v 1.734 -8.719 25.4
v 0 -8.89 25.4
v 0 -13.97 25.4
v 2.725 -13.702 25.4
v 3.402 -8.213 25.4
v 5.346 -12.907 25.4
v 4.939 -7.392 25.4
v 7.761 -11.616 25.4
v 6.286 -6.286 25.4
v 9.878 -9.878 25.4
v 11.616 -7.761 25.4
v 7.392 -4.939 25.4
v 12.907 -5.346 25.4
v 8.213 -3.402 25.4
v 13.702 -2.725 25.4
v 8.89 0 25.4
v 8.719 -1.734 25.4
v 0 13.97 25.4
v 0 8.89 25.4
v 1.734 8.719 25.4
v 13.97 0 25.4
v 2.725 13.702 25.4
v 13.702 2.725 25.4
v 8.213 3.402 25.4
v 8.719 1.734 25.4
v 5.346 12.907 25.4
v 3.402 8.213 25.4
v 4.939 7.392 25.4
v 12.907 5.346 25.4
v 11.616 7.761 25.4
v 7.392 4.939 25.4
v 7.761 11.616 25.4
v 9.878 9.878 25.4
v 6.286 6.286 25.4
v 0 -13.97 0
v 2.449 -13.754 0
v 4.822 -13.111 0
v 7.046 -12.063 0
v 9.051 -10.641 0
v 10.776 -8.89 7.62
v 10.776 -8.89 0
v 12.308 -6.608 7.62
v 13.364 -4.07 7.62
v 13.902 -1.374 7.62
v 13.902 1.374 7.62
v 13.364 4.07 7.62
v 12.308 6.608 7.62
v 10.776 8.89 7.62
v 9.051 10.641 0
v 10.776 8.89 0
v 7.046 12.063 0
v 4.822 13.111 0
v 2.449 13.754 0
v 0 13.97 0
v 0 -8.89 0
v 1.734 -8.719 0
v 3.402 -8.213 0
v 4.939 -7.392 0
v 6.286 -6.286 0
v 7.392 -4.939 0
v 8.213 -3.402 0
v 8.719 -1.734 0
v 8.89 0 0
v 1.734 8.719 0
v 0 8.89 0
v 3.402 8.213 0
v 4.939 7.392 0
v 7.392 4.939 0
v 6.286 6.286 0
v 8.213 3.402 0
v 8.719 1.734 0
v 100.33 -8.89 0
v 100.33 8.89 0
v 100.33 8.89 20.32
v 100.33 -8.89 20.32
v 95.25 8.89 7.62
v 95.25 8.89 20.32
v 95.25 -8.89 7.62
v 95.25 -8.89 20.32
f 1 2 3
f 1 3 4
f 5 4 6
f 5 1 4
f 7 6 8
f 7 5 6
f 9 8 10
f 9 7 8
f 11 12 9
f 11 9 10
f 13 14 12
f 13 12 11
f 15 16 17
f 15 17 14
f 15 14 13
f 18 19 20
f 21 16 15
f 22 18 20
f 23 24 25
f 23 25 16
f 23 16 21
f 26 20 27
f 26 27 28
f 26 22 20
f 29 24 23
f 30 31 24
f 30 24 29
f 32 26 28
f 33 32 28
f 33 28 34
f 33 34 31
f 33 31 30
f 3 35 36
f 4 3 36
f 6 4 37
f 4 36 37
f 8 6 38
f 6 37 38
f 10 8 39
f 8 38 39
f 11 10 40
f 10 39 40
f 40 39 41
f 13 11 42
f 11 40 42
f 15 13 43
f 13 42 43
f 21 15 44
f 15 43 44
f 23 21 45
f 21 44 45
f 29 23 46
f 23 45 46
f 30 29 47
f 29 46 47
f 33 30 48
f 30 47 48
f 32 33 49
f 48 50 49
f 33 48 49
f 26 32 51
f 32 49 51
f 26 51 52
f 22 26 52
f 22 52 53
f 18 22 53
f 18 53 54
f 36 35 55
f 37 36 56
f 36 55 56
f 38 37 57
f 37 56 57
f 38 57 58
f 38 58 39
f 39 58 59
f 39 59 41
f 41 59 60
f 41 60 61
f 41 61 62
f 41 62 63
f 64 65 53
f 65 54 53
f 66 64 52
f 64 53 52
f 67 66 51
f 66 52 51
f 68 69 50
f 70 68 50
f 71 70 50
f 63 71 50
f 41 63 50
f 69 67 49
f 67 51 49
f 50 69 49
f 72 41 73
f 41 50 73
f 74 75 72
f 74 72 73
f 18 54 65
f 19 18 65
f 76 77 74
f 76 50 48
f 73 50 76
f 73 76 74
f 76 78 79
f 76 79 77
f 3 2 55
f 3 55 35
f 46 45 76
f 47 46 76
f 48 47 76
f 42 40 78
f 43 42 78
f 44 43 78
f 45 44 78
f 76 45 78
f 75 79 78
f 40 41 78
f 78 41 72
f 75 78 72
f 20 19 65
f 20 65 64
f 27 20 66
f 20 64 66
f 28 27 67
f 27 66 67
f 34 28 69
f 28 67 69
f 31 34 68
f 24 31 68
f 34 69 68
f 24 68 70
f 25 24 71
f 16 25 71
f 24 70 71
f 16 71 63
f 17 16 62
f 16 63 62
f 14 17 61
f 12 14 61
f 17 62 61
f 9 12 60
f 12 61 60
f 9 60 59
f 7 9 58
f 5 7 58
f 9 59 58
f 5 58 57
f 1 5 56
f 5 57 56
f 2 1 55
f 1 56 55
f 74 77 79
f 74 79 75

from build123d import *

# Parameters (mm, degrees)
F1_DEPTH = 25.4
F3_DEPTH = 7.62
F4_W     = 5.08
F4_H     = 17.78
F5_DEPTH = 12.7


with BuildPart() as f1:
    # F0 (on Top) → F1 (new body)
    with BuildSketch(Plane.XY):
        with BuildLine():
            ThreePointArc((0, 8.89), (8.89, 0), (0, -8.89))
            Line((0, -8.89), (0, -13.97))
            ThreePointArc((0, -13.97), (13.97, 0), (0, 13.97))
            Line((0, 13.97), (0, 8.89))
        make_face()
    extrude(amount=F1_DEPTH)

    # F2 (on face) → F3 (join)
    with BuildSketch(Plane(origin=(0, 0, 0), x_dir=(1, 0, 0), z_dir=(0, 0, -1))):
        with BuildLine():
            Line((100.33, 8.89), (10.7763073453, 8.89))
            ThreePointArc((10.7763073453, 8.89), (13.97, 0), (10.7763073453, -8.89))
            Line((10.7763073453, -8.89), (100.33, -8.89))
            Line((100.33, -8.89), (100.33, 8.89))
        make_face()
    extrude(amount=-F3_DEPTH)

    # F4 (on face) → F5 (join)
    with BuildSketch(Plane.XY.offset(7.62)):
        with Locations((97.79, 0)):
            Rectangle(F4_W, F4_H)
    extrude(amount=F5_DEPTH)


solid = f1.part
